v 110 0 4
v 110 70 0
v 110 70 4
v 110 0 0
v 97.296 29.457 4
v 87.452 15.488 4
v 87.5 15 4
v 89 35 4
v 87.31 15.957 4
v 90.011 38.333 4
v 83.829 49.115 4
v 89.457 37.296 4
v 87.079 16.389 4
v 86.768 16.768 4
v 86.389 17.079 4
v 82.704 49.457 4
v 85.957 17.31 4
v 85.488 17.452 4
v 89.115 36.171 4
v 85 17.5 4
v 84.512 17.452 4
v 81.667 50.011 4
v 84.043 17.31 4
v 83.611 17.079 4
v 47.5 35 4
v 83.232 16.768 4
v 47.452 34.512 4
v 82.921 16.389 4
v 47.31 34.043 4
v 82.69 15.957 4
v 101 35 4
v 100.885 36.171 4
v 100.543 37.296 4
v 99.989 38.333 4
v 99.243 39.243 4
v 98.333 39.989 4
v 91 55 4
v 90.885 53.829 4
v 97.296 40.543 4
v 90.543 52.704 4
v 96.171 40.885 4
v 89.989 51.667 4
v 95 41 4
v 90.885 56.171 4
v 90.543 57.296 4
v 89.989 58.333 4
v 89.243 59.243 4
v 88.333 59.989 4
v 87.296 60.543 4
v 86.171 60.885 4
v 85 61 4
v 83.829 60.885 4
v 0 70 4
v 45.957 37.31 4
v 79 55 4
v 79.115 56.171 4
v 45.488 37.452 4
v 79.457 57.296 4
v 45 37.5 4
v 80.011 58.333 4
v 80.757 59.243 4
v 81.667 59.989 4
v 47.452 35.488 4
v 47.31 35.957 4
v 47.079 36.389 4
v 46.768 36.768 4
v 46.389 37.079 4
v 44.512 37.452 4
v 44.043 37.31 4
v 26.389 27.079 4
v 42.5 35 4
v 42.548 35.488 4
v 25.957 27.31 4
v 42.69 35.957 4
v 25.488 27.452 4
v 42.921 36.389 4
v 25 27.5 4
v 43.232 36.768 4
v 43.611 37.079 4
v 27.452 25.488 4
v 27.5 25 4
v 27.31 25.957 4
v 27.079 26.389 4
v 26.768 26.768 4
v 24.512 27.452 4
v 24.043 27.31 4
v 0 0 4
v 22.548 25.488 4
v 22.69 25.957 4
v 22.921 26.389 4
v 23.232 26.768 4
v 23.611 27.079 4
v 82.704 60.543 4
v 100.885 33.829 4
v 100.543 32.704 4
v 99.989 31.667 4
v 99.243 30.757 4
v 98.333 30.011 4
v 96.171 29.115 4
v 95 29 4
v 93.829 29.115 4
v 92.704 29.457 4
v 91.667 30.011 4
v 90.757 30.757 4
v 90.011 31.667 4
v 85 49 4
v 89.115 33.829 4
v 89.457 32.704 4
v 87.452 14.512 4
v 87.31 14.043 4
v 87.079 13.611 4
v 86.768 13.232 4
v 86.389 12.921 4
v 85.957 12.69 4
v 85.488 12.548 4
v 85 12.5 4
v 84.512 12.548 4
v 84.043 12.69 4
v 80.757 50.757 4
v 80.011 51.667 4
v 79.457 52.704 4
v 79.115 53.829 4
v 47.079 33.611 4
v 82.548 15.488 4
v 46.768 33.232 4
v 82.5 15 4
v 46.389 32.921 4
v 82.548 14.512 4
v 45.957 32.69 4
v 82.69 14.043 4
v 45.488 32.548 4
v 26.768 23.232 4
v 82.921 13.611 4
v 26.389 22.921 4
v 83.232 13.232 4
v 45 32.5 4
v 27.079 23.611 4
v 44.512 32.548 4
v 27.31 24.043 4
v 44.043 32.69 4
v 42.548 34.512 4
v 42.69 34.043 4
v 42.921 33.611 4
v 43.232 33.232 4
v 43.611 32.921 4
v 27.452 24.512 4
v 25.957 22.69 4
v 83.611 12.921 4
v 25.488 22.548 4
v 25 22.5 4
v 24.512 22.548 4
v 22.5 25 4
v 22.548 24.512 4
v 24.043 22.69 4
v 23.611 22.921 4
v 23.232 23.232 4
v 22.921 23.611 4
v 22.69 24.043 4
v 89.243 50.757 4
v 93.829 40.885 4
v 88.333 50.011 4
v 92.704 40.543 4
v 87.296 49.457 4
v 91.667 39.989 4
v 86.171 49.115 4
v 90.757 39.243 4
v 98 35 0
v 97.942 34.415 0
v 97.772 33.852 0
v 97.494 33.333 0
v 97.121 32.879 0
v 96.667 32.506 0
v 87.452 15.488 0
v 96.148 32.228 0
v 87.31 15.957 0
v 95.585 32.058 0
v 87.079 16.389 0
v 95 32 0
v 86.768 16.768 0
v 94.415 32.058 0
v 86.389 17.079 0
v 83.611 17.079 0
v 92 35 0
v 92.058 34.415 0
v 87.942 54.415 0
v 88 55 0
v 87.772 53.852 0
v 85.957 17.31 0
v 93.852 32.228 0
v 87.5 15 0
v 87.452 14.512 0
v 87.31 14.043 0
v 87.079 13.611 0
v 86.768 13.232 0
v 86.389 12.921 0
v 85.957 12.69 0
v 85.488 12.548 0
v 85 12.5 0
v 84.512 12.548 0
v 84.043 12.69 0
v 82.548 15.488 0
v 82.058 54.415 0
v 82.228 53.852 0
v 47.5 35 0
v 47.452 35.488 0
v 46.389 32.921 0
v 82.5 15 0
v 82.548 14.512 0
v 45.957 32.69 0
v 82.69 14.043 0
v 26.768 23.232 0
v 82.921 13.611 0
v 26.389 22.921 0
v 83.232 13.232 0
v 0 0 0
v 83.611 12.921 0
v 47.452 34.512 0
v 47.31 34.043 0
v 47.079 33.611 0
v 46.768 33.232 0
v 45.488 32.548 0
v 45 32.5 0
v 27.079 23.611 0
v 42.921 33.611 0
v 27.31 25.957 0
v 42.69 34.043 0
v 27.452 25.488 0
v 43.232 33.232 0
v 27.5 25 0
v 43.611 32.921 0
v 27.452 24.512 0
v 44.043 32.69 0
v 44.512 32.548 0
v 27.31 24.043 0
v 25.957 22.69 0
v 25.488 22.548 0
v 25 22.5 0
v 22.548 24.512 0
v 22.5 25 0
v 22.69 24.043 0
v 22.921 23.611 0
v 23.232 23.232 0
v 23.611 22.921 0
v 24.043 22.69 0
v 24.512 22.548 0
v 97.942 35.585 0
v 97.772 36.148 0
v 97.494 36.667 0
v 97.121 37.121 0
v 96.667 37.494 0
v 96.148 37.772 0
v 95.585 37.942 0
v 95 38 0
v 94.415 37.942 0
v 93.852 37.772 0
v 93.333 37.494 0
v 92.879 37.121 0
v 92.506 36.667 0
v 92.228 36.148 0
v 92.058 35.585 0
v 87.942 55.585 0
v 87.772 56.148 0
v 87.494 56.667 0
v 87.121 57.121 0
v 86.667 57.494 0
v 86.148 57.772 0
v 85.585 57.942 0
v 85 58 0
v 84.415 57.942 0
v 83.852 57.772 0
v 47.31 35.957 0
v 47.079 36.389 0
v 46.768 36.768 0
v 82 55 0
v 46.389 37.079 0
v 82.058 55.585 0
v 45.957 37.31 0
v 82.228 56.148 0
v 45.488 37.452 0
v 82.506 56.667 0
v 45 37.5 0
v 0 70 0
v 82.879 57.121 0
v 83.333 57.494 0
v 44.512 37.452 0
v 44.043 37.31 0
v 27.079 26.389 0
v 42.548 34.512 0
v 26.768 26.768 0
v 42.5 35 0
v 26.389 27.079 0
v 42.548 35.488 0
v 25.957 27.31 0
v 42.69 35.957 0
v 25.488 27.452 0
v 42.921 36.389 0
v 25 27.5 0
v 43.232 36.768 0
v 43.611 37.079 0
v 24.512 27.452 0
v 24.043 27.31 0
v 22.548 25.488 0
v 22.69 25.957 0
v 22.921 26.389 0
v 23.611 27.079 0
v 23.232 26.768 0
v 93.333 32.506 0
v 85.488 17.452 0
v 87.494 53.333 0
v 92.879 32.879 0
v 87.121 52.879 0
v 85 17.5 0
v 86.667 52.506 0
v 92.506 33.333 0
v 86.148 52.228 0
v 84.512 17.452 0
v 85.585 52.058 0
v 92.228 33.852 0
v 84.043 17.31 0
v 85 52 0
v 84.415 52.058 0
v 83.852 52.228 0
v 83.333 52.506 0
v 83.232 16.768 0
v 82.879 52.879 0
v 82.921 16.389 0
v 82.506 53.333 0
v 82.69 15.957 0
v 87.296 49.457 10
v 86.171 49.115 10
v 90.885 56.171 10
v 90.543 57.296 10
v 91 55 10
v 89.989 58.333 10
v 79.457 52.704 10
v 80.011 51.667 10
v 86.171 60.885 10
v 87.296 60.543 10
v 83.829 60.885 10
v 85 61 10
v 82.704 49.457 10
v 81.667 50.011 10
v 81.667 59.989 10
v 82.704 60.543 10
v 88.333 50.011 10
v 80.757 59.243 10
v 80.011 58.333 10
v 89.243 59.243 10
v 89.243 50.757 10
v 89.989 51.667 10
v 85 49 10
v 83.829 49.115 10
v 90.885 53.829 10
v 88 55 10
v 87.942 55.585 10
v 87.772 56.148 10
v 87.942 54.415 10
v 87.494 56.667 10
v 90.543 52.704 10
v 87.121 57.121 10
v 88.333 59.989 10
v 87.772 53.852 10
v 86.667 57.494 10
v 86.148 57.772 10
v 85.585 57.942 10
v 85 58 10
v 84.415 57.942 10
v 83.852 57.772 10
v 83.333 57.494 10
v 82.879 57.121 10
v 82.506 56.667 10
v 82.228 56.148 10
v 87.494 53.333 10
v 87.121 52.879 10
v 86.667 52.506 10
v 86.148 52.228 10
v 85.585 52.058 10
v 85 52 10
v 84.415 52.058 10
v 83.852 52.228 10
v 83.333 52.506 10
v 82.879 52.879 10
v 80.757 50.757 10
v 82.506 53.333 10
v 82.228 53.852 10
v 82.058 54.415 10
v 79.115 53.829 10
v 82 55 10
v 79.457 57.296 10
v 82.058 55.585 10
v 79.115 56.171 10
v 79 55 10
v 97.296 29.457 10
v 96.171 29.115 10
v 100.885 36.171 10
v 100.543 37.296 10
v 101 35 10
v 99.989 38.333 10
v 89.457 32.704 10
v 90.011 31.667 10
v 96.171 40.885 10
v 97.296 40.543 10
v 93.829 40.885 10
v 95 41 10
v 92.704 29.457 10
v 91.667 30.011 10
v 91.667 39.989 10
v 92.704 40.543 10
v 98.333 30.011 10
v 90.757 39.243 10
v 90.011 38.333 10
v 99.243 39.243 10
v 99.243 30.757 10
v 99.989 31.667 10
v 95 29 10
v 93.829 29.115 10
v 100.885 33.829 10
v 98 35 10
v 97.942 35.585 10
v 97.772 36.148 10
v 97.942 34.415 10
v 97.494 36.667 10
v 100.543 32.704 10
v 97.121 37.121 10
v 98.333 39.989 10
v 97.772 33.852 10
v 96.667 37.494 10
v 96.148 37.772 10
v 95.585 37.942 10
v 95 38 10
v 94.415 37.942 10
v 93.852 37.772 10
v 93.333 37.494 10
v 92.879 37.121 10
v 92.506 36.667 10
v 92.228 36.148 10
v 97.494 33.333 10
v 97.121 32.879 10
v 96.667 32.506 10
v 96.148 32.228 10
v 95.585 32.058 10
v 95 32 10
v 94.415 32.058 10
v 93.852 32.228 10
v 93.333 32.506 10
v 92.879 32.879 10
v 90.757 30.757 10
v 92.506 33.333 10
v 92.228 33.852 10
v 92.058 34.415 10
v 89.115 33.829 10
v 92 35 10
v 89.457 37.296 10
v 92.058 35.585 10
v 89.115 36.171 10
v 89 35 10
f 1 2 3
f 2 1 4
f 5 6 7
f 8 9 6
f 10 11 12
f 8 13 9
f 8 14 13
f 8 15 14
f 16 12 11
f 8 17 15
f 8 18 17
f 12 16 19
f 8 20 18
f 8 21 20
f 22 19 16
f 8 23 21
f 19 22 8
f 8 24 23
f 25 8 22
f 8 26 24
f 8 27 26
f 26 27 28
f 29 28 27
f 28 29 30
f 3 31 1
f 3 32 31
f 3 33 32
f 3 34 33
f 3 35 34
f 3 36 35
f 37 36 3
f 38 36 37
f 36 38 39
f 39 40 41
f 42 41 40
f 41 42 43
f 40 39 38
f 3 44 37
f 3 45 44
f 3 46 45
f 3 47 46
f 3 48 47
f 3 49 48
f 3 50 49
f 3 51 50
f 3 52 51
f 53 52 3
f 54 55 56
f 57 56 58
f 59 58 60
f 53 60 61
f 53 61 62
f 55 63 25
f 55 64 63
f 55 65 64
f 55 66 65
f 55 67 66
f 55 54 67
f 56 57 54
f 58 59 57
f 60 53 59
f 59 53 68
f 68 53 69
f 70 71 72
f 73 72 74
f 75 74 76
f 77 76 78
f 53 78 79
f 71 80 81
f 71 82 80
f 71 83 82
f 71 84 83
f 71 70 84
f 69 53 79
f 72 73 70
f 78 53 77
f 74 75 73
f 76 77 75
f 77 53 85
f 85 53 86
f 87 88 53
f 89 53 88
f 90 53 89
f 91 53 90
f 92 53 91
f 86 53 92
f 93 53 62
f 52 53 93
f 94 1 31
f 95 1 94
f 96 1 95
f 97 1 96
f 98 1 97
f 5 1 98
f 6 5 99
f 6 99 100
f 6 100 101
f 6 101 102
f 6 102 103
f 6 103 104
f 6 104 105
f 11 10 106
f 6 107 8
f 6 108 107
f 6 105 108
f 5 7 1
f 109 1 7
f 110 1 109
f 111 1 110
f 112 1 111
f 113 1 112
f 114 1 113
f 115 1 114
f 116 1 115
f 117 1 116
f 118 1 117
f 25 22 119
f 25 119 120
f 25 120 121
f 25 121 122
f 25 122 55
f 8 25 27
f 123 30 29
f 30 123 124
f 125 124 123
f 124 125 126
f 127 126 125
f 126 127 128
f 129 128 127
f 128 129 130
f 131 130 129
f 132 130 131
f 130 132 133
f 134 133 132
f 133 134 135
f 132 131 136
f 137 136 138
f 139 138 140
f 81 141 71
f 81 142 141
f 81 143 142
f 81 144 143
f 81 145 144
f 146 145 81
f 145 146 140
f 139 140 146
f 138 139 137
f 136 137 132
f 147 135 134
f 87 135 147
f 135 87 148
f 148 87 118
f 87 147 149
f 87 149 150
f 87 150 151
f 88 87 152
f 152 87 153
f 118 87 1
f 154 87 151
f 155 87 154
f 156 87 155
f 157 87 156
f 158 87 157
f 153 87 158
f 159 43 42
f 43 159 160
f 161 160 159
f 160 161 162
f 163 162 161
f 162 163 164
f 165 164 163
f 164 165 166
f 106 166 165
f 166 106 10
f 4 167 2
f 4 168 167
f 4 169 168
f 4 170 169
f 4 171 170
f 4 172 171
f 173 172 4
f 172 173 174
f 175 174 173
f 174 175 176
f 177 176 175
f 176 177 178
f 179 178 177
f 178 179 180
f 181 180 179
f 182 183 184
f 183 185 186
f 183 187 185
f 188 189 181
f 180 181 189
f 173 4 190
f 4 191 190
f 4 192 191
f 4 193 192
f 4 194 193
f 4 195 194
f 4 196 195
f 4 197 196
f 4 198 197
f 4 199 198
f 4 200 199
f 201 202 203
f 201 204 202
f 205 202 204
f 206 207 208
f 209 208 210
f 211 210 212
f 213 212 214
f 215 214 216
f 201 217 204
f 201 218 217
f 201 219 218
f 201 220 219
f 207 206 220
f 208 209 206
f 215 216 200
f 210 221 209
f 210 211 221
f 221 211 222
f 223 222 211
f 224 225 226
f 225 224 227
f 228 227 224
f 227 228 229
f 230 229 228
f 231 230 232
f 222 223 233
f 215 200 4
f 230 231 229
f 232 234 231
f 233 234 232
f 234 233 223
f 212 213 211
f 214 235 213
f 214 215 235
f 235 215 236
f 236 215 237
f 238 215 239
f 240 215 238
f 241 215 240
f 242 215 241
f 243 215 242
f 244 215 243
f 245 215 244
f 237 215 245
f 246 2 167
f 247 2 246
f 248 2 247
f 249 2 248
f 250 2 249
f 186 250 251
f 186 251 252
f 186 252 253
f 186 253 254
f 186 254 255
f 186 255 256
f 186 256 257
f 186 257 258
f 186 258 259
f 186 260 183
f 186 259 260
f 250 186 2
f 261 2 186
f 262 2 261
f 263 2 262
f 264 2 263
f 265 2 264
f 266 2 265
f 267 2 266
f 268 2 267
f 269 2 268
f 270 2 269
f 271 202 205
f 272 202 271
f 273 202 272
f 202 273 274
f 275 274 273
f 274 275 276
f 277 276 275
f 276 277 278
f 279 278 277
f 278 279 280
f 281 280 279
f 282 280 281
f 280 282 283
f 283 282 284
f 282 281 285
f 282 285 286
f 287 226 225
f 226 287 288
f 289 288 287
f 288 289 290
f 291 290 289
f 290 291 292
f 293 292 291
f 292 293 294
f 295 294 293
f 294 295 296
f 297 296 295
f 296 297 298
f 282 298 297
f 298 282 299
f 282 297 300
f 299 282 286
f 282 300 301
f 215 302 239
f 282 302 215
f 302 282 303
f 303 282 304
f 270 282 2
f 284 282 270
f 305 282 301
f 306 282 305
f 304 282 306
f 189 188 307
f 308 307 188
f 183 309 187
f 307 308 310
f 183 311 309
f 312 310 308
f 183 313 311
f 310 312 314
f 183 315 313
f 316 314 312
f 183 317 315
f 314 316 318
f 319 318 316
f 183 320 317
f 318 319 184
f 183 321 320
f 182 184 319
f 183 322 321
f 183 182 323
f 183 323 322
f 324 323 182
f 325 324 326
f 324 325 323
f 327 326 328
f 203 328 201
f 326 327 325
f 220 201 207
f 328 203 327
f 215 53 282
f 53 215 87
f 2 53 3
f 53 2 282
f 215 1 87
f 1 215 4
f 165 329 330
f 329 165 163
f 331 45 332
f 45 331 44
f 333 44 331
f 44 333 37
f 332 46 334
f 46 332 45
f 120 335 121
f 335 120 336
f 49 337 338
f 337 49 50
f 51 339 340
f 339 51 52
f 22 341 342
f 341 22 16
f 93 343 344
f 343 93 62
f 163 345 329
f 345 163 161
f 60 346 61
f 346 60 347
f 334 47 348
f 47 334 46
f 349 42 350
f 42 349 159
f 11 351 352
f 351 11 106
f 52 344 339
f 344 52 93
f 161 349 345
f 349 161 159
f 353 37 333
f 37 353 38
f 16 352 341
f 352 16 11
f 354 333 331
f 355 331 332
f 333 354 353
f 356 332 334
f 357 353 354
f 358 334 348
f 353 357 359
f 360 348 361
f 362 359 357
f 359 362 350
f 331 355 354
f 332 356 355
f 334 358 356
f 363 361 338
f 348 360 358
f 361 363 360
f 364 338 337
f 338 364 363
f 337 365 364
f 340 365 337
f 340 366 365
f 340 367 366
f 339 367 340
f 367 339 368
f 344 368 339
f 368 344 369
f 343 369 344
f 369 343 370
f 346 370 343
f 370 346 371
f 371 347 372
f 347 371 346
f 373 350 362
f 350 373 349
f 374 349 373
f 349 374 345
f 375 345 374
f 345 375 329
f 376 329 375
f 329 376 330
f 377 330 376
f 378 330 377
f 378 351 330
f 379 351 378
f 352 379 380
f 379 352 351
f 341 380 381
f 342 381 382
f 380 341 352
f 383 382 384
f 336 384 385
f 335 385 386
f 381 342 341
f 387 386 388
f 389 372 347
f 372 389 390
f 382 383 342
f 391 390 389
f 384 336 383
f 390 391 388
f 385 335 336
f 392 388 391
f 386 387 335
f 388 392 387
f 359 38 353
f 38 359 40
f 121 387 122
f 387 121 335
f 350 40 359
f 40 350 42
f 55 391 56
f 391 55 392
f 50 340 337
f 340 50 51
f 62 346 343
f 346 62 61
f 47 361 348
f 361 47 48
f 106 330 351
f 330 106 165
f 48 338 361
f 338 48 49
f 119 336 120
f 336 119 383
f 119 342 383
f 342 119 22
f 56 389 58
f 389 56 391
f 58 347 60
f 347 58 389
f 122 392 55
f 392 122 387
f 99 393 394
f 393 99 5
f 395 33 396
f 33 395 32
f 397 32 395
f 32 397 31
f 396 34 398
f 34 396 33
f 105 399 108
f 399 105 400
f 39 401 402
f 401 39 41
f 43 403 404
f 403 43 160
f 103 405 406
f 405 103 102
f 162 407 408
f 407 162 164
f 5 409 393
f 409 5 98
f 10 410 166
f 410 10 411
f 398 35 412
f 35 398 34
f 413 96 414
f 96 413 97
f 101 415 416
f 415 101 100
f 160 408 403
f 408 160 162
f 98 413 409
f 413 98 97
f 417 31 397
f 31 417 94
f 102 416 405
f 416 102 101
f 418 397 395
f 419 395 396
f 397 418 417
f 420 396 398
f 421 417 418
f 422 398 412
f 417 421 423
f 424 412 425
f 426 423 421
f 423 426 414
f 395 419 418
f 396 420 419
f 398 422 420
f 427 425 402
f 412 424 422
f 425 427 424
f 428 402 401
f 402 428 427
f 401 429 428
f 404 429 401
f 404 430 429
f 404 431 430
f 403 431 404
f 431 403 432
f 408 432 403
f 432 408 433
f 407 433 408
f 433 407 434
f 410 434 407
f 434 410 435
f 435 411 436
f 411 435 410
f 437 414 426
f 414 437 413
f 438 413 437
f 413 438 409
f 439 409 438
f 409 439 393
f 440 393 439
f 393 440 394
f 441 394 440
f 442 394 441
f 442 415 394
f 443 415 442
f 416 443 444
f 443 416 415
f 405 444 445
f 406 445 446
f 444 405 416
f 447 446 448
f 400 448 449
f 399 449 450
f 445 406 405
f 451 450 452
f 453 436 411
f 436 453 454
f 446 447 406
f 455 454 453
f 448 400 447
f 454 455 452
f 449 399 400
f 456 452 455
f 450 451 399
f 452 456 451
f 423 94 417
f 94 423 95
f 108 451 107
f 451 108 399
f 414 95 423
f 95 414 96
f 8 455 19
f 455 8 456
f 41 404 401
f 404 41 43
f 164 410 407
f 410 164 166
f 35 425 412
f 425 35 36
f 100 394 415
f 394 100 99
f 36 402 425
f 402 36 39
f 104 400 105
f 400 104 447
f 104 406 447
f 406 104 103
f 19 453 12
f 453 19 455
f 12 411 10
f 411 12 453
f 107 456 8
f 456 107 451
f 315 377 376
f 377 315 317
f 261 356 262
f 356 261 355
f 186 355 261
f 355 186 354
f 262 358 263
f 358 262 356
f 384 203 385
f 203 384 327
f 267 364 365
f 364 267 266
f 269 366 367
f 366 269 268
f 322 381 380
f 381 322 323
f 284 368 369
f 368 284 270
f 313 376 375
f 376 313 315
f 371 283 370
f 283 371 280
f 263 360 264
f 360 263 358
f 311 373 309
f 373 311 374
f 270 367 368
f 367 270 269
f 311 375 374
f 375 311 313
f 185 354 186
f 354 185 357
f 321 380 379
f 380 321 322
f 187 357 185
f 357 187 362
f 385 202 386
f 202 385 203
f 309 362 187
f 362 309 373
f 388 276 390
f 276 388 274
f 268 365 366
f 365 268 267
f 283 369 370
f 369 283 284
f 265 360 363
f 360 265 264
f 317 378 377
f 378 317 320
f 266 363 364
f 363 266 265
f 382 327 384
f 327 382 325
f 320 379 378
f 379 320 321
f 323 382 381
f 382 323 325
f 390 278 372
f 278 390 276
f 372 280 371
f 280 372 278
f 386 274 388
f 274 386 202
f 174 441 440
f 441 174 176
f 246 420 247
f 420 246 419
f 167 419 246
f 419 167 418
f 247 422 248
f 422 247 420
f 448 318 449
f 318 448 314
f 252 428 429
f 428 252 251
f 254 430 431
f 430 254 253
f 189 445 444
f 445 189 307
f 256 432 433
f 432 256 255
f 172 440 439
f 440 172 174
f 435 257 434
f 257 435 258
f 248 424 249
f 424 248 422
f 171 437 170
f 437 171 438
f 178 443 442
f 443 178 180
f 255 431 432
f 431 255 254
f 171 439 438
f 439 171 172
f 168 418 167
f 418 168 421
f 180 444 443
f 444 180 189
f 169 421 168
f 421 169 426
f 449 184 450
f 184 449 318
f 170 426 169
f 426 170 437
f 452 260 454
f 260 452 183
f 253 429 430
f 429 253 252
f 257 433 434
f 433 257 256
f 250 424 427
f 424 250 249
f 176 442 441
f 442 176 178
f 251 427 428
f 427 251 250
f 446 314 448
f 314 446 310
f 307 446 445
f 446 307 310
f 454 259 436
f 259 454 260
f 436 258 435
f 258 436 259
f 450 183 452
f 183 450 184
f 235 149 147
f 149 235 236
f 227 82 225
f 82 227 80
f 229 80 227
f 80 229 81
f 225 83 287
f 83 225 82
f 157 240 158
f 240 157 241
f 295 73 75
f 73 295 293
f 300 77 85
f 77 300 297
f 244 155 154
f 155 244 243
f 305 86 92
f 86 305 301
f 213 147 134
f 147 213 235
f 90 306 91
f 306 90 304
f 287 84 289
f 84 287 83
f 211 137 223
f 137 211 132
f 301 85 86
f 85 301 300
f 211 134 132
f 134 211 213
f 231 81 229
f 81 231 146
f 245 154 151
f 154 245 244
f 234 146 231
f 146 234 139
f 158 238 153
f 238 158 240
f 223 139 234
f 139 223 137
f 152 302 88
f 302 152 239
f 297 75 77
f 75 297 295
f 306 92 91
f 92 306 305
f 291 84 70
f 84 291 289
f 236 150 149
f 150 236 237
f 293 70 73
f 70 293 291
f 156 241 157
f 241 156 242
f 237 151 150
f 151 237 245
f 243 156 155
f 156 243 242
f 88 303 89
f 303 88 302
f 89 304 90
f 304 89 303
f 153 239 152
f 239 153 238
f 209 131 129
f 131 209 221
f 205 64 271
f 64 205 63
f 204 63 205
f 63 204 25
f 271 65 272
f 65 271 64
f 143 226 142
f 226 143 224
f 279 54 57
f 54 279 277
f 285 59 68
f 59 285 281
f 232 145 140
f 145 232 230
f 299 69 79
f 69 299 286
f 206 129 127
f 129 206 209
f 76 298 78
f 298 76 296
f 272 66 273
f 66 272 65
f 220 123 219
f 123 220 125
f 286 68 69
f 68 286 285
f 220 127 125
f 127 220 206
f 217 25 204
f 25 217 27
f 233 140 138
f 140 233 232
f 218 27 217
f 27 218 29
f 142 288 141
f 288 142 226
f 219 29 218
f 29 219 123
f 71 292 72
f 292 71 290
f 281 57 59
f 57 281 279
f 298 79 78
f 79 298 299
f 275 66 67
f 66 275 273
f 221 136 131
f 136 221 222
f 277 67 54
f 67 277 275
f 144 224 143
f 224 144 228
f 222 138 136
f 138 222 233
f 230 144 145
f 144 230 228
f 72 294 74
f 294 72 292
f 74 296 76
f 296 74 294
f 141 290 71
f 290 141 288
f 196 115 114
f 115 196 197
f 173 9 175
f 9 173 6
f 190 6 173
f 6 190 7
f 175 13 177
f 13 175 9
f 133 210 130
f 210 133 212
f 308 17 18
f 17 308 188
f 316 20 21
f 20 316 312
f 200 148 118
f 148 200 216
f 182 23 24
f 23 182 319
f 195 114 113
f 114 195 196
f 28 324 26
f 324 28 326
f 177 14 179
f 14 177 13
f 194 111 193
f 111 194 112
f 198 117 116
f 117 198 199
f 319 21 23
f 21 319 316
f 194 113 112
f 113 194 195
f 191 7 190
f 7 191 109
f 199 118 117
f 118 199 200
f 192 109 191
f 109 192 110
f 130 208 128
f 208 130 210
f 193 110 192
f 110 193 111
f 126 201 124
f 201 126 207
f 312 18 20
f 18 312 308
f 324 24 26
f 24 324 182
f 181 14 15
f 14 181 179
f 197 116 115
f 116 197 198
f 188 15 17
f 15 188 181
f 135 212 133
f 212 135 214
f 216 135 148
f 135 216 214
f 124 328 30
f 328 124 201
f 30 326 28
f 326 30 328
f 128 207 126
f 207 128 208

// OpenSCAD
$fn = 32;

// ----------------------------------------------------------------------
// Mixed field: bosses and holes at given coordinates
// ----------------------------------------------------------------------

// --- parameters (mm) ---
plate_l = 110;            // plate length, X
plate_w = 70;             // plate width, Y
plate_t = 4;              // plate thickness, Z
boss_d = 12;              // boss diameter
boss_h = 6;               // boss height above the plate
hole_d = 5;               // through hole diameter

total_h = plate_t + boss_h;  // overall height

difference() {
  union() {
    cube([plate_l, plate_w, plate_t]);
    translate([85, 55, plate_t]) cylinder(h = boss_h, d = boss_d);
    translate([95, 35, plate_t]) cylinder(h = boss_h, d = boss_d);
  }
  translate([85, 55, -1]) cylinder(h = total_h + 2, d = boss_d / 2);
  translate([95, 35, -1]) cylinder(h = total_h + 2, d = boss_d / 2);
  translate([25, 25, -1]) cylinder(h = plate_t + 2, d = hole_d);
  translate([45, 35, -1]) cylinder(h = plate_t + 2, d = hole_d);
  translate([85, 15, -1]) cylinder(h = plate_t + 2, d = hole_d);
}
